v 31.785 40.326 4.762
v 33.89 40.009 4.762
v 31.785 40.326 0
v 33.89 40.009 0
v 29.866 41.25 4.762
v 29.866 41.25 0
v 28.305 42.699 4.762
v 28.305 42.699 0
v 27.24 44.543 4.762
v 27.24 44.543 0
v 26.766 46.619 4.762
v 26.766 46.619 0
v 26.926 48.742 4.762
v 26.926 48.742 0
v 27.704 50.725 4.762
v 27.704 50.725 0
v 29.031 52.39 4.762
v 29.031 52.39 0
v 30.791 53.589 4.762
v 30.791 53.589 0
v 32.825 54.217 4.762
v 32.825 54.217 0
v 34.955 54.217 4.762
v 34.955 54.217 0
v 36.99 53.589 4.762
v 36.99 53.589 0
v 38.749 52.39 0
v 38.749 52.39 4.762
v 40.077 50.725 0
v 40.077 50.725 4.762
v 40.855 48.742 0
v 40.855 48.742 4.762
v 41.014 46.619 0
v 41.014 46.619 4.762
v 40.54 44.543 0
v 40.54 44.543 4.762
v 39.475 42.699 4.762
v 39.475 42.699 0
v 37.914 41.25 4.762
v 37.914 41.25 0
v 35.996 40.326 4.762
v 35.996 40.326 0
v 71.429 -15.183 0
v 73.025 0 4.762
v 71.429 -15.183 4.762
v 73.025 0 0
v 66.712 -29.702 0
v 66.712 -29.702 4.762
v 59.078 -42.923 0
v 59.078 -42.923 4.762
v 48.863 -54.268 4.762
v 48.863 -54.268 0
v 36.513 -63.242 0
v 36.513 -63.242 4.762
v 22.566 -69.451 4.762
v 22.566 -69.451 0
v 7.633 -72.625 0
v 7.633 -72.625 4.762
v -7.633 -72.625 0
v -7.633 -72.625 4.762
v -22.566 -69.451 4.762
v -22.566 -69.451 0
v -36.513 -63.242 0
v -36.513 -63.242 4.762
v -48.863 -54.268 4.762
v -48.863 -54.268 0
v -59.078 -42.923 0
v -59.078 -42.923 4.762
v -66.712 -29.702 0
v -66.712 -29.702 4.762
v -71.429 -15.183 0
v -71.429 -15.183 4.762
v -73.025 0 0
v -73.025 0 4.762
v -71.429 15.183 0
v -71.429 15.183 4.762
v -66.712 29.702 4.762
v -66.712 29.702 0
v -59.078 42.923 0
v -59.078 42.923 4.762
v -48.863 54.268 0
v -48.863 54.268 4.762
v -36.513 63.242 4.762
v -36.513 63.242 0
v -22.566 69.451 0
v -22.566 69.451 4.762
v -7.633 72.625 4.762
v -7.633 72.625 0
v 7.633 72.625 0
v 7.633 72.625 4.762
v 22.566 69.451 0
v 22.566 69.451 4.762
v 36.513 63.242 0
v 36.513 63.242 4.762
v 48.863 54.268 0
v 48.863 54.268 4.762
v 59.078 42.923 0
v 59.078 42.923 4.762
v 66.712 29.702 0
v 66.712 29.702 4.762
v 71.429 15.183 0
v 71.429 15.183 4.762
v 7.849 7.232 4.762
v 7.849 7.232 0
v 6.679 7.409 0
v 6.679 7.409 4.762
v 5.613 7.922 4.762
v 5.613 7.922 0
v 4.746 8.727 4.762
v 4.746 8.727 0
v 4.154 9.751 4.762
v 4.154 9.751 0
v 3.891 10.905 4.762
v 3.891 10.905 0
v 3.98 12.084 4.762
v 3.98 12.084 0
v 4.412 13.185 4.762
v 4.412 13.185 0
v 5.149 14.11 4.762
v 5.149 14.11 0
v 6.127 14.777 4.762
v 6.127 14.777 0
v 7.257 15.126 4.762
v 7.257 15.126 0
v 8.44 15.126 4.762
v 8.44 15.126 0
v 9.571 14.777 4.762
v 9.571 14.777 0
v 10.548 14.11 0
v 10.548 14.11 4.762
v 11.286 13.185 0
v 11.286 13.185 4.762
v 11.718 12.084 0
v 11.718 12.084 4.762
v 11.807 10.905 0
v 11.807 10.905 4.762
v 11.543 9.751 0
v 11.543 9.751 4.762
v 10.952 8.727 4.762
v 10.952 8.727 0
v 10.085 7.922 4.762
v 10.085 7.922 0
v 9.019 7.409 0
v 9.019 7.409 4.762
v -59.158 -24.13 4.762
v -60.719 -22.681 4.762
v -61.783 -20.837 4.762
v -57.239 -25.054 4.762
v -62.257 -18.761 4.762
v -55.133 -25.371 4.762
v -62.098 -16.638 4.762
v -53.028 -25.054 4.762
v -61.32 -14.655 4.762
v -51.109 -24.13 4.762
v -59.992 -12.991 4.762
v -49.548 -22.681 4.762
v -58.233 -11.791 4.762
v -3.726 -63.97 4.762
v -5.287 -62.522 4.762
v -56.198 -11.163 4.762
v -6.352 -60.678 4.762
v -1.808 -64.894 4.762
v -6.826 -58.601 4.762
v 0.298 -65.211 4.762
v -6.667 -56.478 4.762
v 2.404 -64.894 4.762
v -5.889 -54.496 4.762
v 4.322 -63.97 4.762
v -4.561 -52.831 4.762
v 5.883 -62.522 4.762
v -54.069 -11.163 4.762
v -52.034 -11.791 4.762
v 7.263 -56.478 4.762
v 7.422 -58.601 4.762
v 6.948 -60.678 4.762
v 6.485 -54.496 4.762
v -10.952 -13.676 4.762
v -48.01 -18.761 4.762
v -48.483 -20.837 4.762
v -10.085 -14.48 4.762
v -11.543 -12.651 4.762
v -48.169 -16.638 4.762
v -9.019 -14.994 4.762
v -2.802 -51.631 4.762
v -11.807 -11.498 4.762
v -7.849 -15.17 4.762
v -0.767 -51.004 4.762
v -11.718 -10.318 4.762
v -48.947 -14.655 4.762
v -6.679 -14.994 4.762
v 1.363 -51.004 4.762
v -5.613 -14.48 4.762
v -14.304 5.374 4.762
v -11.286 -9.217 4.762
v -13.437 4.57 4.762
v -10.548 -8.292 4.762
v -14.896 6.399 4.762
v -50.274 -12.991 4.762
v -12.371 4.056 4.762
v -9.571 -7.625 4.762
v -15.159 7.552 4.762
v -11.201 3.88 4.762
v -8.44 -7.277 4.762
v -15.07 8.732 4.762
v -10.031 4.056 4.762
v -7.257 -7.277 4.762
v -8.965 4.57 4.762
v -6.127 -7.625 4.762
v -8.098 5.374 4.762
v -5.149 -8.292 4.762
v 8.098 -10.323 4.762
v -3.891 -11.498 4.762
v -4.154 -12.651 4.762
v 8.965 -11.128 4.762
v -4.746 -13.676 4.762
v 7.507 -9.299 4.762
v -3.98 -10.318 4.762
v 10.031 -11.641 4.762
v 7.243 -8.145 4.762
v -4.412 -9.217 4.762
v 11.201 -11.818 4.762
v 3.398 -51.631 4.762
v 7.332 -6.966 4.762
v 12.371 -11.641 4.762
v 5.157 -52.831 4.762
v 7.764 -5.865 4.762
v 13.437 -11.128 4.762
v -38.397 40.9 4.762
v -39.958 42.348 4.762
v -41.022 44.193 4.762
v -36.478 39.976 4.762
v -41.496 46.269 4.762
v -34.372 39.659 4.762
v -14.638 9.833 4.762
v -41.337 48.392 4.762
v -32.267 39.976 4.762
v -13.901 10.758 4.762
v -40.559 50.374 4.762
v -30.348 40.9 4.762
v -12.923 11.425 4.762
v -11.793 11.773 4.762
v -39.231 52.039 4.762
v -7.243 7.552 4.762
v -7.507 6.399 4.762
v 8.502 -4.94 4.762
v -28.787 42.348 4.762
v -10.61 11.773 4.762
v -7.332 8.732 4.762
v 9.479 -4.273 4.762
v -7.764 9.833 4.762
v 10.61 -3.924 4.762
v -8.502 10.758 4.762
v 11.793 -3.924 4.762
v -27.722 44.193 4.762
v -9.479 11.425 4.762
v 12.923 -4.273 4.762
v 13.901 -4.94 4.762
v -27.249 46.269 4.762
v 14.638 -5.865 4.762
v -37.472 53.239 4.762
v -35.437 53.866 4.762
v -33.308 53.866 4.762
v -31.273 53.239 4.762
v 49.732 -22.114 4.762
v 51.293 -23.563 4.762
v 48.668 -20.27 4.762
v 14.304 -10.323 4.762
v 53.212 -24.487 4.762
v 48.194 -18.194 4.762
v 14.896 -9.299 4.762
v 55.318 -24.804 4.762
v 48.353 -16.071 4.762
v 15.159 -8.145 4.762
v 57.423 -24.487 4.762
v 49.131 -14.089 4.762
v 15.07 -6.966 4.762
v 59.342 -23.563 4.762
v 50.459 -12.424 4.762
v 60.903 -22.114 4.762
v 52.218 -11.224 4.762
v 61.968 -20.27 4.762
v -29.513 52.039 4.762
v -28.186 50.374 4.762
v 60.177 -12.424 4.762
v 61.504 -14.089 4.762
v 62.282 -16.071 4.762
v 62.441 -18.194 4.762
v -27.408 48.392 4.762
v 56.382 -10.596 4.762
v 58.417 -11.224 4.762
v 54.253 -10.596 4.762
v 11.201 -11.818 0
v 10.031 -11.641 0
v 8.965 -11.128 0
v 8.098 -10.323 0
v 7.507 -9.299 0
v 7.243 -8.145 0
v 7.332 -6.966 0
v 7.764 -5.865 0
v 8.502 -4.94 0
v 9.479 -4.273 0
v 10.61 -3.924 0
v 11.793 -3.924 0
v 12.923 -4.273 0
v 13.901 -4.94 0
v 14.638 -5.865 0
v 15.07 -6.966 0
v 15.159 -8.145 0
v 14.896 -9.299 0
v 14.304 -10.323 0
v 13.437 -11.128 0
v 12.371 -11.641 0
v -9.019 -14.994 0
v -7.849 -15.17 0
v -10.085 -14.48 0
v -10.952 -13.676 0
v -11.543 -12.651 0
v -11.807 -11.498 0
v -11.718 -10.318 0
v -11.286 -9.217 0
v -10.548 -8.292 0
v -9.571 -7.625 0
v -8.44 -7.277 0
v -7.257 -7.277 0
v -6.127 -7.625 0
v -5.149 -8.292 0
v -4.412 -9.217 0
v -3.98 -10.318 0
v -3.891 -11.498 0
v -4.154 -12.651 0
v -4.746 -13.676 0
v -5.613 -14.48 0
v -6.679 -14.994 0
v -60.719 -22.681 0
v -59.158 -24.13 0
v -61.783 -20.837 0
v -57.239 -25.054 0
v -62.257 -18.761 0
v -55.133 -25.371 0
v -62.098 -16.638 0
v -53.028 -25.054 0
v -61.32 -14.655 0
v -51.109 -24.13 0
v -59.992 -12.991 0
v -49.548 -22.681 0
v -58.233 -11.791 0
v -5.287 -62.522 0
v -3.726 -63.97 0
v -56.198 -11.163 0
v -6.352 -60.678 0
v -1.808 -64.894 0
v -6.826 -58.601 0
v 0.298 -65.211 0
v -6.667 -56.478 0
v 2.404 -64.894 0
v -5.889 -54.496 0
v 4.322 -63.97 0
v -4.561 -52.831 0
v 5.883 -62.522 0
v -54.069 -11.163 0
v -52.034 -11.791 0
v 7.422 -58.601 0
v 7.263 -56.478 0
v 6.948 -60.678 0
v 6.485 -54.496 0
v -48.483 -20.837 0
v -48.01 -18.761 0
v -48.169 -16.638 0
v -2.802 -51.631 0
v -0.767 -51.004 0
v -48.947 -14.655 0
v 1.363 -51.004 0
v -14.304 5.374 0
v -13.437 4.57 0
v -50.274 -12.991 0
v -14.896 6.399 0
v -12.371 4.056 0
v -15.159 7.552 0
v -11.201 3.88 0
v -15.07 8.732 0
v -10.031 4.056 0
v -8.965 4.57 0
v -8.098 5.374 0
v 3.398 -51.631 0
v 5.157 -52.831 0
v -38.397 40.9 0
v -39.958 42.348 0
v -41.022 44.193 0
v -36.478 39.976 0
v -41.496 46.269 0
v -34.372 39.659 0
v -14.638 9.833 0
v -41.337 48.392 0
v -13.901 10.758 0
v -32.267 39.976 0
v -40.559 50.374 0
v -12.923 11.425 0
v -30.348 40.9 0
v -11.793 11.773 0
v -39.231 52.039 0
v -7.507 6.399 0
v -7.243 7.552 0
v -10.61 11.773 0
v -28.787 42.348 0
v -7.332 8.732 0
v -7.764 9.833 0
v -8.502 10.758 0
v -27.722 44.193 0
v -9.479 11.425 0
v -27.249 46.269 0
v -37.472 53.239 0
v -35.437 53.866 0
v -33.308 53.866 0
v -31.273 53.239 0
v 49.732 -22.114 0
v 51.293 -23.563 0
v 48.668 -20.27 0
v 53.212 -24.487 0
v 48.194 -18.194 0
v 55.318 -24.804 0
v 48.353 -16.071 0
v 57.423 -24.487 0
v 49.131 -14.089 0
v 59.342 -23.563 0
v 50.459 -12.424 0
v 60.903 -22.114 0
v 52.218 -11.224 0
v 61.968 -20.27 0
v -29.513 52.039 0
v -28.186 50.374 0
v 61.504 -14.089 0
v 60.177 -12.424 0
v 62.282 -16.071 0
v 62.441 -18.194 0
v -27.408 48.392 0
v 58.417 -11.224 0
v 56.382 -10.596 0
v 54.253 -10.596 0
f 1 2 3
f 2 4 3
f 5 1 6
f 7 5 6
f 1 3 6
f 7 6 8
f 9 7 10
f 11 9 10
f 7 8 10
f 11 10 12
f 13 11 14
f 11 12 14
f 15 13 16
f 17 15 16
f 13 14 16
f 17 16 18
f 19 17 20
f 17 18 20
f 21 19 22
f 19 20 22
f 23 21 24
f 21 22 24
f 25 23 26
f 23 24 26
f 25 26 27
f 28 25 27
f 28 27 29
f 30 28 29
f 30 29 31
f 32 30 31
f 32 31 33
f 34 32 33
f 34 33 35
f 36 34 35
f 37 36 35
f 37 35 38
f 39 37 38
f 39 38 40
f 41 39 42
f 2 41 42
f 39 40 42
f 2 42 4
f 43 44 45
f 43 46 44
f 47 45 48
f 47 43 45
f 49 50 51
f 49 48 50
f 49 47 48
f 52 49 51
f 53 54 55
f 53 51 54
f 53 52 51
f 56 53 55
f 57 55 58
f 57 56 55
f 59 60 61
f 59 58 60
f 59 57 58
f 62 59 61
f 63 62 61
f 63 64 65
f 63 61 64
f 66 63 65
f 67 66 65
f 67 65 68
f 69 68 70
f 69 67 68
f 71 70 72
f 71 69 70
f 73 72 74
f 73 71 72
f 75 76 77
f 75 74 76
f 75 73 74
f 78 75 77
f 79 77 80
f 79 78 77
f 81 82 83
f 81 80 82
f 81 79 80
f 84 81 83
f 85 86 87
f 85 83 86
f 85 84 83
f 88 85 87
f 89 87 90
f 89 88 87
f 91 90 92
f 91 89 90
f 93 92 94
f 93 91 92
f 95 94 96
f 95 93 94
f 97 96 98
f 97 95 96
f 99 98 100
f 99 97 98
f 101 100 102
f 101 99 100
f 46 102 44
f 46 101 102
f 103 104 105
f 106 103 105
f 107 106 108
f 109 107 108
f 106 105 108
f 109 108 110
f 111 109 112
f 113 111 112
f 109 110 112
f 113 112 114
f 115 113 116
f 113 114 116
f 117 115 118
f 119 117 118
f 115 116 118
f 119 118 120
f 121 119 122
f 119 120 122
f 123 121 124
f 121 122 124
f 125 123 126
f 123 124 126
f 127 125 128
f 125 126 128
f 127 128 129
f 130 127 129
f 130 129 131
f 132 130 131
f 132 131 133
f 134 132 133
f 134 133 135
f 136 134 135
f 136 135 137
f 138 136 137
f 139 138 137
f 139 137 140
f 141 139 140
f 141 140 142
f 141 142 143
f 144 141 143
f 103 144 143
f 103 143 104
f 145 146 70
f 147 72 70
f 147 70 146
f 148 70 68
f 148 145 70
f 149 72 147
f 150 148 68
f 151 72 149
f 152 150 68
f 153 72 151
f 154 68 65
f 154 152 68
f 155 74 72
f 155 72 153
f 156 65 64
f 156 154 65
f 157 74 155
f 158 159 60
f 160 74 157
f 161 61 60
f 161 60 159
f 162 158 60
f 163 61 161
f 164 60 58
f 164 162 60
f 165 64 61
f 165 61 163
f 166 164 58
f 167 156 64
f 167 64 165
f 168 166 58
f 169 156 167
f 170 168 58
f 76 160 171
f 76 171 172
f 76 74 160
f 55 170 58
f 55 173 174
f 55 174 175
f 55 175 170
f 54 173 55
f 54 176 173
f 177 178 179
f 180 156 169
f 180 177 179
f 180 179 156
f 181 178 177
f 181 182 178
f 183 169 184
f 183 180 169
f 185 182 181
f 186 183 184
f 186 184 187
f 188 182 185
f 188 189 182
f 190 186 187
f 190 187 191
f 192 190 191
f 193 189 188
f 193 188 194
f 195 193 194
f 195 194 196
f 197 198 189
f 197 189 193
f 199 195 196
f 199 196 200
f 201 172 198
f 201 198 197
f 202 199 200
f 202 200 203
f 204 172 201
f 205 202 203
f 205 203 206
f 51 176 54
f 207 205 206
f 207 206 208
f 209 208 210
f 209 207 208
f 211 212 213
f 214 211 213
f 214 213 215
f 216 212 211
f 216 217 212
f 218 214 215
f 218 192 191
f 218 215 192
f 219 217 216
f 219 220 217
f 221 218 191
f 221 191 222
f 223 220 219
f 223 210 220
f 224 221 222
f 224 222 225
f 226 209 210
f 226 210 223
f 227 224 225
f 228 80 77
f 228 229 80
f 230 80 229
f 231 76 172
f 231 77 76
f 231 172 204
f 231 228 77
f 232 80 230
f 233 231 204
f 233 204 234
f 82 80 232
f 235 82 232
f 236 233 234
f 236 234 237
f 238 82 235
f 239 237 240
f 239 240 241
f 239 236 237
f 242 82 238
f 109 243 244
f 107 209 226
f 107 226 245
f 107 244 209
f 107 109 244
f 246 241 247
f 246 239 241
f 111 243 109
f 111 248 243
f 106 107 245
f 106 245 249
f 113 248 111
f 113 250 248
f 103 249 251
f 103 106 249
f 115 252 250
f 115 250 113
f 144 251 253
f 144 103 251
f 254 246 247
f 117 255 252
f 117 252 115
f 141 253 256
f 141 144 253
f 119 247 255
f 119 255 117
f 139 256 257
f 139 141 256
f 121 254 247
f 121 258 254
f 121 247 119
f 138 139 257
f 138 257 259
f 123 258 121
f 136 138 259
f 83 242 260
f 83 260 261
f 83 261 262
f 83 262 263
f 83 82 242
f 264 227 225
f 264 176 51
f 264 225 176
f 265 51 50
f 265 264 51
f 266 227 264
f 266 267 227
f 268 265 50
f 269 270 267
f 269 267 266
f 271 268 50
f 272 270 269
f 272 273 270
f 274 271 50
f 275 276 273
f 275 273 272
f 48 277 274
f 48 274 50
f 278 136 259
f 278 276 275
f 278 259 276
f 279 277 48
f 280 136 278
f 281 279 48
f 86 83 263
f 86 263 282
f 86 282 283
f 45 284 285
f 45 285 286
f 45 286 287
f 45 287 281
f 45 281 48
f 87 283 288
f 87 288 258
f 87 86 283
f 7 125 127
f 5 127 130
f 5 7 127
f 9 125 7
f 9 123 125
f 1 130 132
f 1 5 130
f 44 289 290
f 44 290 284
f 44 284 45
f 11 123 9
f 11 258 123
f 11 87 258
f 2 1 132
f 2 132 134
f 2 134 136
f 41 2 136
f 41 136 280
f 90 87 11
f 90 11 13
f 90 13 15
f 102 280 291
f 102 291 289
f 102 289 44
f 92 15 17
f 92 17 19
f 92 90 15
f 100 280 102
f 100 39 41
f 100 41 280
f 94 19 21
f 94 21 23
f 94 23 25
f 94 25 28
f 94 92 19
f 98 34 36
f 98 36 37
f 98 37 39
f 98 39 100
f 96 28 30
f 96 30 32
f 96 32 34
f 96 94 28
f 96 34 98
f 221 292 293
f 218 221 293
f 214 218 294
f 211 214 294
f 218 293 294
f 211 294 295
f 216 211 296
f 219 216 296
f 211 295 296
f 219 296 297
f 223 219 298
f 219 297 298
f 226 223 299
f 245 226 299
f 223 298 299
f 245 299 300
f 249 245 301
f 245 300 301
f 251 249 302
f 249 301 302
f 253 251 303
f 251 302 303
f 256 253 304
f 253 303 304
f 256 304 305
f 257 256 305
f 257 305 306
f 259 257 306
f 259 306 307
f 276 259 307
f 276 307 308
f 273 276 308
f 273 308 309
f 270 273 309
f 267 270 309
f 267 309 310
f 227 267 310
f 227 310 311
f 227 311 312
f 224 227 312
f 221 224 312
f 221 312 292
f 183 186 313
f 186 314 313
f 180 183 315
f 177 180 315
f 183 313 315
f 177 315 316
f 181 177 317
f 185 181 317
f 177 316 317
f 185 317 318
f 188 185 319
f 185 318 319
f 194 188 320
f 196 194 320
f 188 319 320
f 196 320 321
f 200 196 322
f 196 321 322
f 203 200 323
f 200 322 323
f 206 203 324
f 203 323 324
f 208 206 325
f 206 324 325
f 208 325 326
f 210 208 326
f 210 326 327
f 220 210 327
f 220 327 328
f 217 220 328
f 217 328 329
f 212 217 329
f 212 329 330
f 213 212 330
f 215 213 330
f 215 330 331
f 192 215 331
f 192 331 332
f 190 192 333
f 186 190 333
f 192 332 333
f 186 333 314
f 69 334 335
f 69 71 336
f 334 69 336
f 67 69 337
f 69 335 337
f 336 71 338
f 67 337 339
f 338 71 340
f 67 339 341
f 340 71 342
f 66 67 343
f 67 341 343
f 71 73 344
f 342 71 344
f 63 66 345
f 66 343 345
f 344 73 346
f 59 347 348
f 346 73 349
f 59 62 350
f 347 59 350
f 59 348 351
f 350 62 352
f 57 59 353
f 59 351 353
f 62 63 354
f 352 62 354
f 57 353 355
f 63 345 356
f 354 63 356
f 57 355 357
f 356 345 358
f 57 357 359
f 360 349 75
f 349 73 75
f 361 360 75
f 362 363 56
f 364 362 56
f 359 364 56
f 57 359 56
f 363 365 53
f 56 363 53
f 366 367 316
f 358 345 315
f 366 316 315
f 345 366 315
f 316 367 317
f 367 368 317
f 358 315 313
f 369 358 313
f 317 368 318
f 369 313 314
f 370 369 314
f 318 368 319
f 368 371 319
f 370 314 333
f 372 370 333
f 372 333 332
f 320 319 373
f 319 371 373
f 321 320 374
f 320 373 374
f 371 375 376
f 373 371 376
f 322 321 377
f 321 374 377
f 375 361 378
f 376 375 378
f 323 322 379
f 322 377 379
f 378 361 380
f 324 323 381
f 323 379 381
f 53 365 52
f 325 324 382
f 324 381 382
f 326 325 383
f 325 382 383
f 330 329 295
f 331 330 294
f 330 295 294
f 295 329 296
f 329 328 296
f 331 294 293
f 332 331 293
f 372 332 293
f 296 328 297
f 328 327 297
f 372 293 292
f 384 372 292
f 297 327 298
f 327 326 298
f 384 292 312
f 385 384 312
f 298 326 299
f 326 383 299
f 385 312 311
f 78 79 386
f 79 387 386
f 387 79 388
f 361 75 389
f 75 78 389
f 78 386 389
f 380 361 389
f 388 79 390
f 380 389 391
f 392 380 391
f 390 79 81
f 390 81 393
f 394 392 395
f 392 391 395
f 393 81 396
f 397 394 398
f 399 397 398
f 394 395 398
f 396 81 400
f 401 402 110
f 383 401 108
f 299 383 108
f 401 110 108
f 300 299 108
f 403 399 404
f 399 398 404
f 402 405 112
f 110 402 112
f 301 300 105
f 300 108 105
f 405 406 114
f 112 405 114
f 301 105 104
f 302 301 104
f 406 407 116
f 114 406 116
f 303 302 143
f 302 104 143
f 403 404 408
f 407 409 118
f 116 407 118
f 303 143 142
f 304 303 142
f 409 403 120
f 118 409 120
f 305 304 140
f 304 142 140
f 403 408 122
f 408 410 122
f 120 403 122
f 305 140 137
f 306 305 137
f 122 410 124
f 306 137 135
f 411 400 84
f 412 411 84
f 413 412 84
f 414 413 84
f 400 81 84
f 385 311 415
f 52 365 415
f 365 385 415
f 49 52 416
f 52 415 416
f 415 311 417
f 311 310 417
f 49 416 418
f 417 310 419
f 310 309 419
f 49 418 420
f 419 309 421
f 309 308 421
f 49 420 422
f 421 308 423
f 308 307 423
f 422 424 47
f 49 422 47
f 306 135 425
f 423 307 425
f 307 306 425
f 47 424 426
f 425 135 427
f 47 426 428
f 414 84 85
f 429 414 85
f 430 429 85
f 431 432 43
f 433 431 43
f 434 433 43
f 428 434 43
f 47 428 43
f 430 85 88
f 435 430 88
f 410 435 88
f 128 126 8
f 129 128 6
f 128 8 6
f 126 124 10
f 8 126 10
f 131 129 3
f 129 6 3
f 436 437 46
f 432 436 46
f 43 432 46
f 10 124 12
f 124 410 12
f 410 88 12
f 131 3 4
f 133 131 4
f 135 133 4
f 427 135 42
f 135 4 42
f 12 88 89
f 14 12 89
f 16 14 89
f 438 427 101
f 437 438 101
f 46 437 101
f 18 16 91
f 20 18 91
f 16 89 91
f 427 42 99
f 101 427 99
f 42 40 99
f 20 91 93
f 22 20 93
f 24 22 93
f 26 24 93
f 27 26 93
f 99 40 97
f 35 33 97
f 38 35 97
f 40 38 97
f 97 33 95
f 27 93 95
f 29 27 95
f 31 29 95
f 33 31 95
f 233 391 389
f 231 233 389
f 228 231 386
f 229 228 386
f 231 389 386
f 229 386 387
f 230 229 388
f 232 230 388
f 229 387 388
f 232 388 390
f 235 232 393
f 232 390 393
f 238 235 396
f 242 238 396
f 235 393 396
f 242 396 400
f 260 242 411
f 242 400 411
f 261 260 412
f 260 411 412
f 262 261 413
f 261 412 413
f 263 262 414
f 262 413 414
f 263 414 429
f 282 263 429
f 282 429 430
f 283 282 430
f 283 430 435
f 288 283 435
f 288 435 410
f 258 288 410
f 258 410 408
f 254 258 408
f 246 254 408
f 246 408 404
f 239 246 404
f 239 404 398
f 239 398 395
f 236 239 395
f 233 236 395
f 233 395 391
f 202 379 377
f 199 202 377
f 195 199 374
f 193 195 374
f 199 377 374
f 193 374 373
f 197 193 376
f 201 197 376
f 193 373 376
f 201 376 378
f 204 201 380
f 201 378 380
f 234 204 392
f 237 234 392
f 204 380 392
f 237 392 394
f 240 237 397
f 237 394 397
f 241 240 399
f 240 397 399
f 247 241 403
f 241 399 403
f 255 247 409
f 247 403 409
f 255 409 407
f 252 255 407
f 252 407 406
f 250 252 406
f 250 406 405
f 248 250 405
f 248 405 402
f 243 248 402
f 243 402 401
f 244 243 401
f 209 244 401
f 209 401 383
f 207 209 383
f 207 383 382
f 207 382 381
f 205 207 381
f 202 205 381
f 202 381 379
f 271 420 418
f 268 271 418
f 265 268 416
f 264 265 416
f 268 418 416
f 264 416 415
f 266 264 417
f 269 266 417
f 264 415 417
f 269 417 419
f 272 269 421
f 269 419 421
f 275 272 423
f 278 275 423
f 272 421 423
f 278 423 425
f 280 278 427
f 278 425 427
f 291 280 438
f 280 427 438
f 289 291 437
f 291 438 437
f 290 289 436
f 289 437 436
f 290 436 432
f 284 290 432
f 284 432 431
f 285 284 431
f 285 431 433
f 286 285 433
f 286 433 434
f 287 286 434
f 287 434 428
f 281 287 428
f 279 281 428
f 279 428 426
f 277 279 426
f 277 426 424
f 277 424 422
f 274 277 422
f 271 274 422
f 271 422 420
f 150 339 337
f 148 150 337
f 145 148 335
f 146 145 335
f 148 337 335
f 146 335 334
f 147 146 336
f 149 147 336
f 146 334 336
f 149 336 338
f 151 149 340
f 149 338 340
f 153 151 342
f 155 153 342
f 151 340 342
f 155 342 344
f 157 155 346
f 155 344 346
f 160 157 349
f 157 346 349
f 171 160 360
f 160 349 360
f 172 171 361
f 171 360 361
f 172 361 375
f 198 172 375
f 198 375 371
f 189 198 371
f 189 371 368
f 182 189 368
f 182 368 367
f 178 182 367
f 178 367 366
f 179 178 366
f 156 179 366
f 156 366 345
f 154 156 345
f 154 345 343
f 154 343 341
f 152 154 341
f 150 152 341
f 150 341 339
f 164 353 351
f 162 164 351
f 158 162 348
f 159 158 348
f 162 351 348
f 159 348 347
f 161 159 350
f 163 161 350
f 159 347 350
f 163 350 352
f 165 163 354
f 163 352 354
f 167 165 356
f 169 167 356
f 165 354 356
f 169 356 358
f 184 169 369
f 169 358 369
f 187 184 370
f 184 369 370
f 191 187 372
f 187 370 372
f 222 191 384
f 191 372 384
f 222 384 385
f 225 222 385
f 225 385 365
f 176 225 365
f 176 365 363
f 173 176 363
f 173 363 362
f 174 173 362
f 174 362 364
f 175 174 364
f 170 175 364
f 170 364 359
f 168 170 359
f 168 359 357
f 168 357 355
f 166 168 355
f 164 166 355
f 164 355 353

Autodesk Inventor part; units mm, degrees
ref_plane "YZ Plane" through (0, 0, 0) normal (1, 0, 0) x (0, 1, 0)
ref_plane "XZ Plane" through (0, 0, 0) normal (0, 1, 0) x (-1, 0, 0)
ref_plane "XY Plane" through (0, 0, 0) normal (0, 0, 1) x (1, 0, 0)
sketch "Sketch1" plane through (0, 0, 0) normal (0, 0, 1) x (1, 0, 0)
  circle A0 centre (0, 0) radius 73.025
  dimension "d7" = 146.05
extrude "Plate1" add sketch "Sketch1" along normal blind 4.7625
sketch "Sketch2" plane through (0, 0, 4.7625) normal (0, 0, 1) x (1, 0, 0)
  circle A0 centre (-11.2011, 7.8489) radius 3.9688
  circle A1 centre (-7.8489, -11.2011) radius 3.9688
  circle A2 centre (11.2011, -7.8489) radius 3.9688
  circle A3 centre (7.8489, 11.2011) radius 3.9688
  point P0 (0, 0)
  dimension "d8" = 7.9375
  dimension "d11" = 360
  dimension "d20" = 19.05
hole "Hole1" at (-11.2011, 7.8489, 4.7625) at (7.8489, 11.2011, 4.7625) at (-7.8489, -11.2011, 4.7625) at (11.2011, -7.8489, 4.7625) direction (0, 0, -1) diameter 7.9375 end through all
sketch "Sketch3" plane through (0, 0, 4.7625) normal (0, 0, 1) x (1, 0, 0)
  circle A0 centre (-34.3723, 46.8025) radius 6.498 construction
  circle A1 centre (-55.1334, -18.2273) radius 6.498 construction
  circle A2 centre (0.298, -58.0676) radius 6.498 construction
  circle A3 centre (55.3176, -17.6604) radius 6.498 construction
  circle A4 centre (33.8902, 47.1528) radius 6.498 construction
  point P0 (0, 0)
  dimension "d21" = 12.9959
  dimension "d24" = 360
  dimension "d33" = 68.2625
hole "Hole2" at (33.8902, 47.1528, 4.7625) at (55.3176, -17.6604, 4.7625) at (0.298, -58.0676, 4.7625) at (-55.1334, -18.2273, 4.7625) at (-34.3723, 46.8025, 4.7625) direction (0, 0, -1) diameter 14.2875 end through all
equation "\"d18\" = Thickness"
equation "\"d31\" = Thickness"
equation "\"BendRadius\" = Thickness"
equation "\"BendReliefWidth\" = Thickness"
equation "\"BendReliefDepth\" = 0.5 * Thickness"
equation "\"CornerReliefSize\" = 4 * Thickness"
equation "\"MinimumRemnant\" = 2 * Thickness"
equation "\"TransitionRadius\" = BendRadius"
equation "\"JacobiRadiusSize\" = BendRadius"
equation "\"GapSize\" = Thickness"
equation "\"d0\" = BendRadius"
equation "\"Thickness\" = 4.7625"
properties part number "WheelHub" material "Steel, Mild"
